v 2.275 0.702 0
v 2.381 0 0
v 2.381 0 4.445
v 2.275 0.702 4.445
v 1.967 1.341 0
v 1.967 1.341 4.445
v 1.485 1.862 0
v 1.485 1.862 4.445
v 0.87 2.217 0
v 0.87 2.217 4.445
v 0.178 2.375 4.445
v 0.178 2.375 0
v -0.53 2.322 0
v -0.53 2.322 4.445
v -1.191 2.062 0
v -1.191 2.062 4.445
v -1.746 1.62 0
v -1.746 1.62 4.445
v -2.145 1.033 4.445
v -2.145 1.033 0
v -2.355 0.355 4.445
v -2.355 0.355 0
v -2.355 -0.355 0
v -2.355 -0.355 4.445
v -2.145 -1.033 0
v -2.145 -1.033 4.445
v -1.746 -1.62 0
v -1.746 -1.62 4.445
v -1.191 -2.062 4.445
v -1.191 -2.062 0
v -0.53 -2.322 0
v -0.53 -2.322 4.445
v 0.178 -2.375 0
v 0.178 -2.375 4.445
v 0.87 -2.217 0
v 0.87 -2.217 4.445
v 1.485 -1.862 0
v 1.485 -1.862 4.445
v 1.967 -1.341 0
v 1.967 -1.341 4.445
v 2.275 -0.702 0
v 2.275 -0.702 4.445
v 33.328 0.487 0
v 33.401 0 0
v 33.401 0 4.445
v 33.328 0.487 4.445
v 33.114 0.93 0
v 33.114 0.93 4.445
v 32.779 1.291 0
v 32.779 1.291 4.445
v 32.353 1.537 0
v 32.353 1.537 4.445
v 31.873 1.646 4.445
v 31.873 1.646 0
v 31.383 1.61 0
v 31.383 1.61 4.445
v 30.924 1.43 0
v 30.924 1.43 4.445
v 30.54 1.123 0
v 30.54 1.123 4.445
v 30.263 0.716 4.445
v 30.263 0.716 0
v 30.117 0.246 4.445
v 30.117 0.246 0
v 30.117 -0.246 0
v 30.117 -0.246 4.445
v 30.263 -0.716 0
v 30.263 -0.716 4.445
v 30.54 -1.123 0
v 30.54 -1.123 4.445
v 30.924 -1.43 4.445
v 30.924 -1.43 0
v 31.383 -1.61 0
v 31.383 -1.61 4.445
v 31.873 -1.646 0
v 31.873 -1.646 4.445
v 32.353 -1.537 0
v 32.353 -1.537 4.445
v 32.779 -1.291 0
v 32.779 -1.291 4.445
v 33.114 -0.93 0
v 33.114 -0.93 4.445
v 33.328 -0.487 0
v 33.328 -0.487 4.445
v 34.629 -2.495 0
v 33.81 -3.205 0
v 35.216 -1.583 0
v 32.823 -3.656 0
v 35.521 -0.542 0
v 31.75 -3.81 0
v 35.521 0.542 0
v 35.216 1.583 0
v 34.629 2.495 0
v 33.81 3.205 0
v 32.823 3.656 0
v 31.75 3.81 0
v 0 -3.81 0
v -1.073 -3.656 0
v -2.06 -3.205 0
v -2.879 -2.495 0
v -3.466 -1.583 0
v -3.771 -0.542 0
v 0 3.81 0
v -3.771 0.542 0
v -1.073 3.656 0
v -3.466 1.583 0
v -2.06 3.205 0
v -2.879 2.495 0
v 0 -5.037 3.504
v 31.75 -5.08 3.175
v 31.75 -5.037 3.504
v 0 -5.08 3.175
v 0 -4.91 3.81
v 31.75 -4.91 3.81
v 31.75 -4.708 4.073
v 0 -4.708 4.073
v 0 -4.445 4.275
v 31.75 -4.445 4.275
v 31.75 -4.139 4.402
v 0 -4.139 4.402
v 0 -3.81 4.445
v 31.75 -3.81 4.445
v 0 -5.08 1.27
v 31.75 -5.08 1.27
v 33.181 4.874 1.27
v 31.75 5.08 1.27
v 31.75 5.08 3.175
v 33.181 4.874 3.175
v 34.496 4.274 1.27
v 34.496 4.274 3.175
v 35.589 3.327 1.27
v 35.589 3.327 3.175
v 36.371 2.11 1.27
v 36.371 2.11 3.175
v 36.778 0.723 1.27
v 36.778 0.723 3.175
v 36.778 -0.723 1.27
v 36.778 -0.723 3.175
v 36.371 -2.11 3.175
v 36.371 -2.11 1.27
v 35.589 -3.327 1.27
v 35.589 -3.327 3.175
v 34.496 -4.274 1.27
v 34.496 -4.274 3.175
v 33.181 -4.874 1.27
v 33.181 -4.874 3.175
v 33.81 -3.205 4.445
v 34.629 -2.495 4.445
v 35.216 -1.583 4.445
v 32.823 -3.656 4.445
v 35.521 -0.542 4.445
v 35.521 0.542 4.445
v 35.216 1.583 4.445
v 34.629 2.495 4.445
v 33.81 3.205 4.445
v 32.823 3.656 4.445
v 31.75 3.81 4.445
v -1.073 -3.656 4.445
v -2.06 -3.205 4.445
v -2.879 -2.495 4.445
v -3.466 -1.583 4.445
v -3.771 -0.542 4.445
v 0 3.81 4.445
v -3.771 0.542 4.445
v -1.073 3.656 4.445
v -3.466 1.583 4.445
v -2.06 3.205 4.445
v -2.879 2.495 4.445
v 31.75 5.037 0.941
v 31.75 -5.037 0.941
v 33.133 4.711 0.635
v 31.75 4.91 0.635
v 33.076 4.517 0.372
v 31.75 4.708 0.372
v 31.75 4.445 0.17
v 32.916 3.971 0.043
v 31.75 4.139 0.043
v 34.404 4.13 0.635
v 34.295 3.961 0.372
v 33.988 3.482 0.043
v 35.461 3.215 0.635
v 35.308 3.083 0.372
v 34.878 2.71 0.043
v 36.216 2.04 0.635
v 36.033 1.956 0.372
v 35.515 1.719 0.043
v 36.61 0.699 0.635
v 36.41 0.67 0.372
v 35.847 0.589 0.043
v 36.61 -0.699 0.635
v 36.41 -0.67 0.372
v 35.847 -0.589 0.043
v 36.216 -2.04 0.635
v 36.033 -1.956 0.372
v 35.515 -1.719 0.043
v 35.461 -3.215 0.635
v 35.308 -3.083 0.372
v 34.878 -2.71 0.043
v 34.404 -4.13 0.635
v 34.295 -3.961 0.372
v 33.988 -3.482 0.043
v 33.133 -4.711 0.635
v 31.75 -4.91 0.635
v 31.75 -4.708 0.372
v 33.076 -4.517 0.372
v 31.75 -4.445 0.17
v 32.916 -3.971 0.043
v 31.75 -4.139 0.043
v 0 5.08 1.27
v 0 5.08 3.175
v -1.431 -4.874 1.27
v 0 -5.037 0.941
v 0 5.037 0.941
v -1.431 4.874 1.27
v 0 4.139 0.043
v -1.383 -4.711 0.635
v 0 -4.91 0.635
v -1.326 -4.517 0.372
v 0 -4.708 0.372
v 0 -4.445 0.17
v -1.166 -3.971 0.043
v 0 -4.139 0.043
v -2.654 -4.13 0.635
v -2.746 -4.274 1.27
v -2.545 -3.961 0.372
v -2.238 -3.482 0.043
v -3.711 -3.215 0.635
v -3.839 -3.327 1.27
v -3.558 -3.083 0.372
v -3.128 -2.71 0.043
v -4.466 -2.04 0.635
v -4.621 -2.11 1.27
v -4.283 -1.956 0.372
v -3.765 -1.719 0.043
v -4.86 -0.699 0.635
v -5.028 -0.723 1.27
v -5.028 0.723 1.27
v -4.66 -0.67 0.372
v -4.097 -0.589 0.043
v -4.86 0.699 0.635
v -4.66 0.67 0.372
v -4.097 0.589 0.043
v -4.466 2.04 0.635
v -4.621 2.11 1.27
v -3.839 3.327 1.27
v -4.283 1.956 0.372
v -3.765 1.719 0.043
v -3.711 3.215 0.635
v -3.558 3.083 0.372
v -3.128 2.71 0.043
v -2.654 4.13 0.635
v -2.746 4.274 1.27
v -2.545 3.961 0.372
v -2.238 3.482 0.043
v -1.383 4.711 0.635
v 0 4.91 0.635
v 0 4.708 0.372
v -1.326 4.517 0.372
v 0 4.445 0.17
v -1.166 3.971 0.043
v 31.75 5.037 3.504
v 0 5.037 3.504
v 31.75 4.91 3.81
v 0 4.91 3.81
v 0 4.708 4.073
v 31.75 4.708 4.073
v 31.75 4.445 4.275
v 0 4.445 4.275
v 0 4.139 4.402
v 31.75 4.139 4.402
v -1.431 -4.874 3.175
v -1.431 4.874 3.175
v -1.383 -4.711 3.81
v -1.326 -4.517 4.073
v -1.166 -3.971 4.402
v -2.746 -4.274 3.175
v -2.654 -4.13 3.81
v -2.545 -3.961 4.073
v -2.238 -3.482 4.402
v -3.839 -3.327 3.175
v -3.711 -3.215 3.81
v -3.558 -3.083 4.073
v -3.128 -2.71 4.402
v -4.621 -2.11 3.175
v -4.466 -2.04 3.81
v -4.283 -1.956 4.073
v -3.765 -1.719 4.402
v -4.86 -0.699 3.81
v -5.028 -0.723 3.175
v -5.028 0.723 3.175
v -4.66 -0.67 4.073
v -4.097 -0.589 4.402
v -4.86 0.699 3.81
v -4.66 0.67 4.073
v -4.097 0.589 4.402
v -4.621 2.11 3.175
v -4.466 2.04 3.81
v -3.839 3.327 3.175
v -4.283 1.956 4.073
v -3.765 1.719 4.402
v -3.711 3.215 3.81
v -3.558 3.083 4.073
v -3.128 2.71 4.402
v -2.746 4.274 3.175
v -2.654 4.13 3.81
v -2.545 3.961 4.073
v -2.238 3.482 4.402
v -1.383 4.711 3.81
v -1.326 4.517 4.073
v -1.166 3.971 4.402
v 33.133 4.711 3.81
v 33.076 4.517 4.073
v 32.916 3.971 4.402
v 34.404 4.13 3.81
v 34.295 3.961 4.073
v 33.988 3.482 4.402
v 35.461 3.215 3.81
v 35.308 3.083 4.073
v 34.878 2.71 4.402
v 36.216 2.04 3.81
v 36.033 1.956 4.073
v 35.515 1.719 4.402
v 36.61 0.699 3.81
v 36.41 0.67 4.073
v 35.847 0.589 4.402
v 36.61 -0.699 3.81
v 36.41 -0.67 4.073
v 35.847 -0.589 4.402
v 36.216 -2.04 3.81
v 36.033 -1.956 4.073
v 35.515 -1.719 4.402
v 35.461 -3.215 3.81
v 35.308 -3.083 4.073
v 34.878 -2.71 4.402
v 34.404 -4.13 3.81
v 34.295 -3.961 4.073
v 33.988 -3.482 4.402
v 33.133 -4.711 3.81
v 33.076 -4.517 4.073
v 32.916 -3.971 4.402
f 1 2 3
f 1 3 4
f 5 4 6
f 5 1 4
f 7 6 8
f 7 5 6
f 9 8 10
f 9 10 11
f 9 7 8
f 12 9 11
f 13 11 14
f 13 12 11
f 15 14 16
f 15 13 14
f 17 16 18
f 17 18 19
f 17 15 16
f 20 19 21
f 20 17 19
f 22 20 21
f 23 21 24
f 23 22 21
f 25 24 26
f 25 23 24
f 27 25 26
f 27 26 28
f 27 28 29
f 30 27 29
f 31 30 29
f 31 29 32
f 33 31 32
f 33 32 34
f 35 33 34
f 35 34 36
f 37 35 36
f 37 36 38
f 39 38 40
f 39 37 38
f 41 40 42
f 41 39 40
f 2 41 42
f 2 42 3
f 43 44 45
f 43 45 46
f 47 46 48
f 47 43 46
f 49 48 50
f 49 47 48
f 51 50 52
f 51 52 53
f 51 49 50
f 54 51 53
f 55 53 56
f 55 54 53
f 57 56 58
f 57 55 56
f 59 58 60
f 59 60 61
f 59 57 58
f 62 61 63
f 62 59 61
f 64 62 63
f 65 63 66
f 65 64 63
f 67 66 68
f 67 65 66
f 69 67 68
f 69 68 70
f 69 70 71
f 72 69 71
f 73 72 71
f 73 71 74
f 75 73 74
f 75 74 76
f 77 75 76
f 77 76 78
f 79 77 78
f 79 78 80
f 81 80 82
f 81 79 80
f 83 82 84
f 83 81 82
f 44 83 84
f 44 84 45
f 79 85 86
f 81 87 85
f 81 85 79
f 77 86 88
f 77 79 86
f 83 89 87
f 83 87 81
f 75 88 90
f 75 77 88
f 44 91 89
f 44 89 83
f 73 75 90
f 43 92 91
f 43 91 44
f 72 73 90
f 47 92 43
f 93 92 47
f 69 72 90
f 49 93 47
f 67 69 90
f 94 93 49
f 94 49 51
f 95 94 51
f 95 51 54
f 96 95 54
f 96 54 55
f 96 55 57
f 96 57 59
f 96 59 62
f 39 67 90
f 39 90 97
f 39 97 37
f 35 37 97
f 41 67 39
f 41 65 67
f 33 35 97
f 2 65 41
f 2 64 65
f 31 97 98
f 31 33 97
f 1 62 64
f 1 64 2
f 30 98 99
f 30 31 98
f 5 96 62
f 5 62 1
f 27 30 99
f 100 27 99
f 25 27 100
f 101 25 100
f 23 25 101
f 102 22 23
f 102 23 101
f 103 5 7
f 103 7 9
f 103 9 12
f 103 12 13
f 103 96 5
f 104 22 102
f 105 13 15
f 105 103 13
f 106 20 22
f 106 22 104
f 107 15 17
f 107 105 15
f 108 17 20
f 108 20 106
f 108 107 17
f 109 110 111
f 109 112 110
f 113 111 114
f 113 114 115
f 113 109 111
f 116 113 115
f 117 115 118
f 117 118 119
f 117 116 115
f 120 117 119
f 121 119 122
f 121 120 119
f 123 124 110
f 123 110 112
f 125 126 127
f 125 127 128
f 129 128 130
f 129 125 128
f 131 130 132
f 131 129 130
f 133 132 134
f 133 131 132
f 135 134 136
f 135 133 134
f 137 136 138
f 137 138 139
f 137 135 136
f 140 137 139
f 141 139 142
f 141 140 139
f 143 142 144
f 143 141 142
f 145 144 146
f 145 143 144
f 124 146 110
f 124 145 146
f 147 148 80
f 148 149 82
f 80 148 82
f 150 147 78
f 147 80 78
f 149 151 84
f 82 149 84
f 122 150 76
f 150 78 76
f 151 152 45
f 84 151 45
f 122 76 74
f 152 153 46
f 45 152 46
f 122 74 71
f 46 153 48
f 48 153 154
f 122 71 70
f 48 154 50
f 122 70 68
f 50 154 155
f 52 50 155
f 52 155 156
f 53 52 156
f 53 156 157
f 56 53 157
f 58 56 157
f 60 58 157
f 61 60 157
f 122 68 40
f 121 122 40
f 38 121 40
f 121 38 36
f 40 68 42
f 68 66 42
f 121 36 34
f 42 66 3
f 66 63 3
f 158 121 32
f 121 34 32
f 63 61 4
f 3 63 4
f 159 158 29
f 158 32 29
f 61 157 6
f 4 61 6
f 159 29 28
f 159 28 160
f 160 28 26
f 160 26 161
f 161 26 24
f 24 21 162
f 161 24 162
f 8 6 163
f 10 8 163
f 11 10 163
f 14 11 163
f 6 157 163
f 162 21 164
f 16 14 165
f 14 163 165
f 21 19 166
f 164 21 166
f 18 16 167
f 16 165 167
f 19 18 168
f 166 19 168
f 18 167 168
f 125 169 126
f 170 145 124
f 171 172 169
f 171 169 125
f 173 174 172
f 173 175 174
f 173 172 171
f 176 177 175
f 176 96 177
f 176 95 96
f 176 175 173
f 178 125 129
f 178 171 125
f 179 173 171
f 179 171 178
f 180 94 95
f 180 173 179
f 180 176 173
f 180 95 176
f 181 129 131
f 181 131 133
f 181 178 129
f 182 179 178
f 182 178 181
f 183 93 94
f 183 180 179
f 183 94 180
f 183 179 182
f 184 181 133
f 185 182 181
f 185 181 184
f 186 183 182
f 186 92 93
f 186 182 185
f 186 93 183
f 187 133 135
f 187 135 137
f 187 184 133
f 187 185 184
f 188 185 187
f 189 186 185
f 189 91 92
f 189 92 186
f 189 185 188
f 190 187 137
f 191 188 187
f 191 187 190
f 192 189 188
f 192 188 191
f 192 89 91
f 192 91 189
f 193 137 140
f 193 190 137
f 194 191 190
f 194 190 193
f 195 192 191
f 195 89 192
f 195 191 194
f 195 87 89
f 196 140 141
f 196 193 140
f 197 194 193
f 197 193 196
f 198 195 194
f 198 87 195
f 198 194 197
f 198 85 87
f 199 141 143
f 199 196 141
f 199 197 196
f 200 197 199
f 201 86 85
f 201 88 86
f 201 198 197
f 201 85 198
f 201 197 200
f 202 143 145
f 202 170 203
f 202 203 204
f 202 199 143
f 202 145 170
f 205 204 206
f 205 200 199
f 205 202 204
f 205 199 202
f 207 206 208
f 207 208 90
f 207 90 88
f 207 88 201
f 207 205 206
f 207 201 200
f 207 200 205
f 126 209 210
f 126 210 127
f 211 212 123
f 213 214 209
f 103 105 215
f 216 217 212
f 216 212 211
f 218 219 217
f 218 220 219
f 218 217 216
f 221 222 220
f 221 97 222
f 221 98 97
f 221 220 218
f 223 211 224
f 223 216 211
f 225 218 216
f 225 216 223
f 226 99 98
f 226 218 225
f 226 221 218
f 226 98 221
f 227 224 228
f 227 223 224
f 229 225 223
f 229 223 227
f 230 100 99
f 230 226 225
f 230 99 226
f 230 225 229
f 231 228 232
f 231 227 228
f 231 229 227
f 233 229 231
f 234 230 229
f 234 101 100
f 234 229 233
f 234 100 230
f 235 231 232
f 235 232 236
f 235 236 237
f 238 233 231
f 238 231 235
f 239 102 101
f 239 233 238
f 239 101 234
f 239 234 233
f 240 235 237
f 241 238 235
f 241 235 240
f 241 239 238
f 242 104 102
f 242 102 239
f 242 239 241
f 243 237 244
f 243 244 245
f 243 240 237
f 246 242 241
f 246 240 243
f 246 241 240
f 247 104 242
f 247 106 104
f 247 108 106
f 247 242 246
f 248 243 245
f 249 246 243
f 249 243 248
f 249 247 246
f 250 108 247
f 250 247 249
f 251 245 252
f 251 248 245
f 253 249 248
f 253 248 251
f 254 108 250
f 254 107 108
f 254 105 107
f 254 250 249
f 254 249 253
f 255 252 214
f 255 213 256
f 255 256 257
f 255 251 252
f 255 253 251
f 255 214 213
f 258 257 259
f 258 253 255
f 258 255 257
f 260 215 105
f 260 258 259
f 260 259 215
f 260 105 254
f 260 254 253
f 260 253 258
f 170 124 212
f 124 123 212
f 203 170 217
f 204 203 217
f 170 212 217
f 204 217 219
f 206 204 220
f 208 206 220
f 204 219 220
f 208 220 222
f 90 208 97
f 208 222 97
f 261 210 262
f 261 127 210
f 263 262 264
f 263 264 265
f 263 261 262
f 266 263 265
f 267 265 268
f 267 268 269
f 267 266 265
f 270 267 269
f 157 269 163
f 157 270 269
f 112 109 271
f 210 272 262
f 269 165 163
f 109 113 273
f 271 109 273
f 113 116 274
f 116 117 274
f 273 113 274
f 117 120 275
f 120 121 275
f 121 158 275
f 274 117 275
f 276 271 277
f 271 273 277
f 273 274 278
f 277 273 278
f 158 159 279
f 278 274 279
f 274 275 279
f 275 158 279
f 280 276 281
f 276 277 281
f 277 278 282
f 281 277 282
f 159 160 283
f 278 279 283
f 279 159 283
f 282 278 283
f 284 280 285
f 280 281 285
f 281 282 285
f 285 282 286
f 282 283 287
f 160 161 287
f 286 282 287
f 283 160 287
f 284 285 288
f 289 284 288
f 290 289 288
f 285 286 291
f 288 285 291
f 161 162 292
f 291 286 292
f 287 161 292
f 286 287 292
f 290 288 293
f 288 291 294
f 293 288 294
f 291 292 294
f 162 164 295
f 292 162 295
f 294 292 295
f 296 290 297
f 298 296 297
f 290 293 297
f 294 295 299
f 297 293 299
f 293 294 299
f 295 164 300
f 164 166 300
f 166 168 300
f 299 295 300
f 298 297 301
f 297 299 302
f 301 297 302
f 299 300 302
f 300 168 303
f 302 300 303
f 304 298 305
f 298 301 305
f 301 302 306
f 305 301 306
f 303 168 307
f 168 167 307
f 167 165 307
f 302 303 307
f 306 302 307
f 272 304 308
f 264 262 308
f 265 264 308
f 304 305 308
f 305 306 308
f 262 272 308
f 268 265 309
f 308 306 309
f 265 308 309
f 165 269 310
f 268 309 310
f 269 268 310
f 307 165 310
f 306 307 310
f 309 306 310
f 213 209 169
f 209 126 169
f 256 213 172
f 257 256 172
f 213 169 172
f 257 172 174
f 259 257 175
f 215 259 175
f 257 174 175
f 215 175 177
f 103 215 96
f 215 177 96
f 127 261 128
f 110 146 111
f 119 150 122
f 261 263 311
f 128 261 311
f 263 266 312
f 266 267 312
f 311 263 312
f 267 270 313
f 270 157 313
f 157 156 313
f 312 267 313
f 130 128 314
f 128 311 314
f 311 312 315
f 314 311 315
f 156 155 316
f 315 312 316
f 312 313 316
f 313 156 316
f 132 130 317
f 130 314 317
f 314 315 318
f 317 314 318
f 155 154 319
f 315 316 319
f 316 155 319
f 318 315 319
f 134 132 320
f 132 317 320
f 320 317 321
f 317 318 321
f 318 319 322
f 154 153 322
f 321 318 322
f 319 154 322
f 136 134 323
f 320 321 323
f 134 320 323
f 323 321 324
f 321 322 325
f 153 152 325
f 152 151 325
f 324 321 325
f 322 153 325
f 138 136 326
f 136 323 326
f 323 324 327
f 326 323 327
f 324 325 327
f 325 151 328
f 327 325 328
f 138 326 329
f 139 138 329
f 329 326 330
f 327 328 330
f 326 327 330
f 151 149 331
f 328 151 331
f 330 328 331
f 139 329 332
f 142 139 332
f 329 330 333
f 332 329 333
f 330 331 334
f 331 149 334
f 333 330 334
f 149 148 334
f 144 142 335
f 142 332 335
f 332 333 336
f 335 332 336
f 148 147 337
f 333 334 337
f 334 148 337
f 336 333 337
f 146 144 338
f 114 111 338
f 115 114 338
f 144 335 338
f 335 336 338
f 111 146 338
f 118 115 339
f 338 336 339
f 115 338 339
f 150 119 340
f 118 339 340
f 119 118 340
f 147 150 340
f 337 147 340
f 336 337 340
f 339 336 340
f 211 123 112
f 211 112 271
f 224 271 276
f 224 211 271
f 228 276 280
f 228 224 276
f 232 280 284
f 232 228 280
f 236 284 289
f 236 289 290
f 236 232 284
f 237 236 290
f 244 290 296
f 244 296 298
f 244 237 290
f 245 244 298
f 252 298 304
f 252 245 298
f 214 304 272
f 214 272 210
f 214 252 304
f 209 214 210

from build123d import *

# Parameters (mm, degrees)
SKETCH1_R           = 2.38125
SKETCH1_R_2         = 1.651
BOSS_EXTRUDE1_DEPTH = 4.445
FILLET1_R           = 1.27


with BuildPart() as part:
    # Sketch1 → Boss-Extrude1 (new body)
    with BuildSketch(Plane.XY):
        with BuildLine():
            Line((0, 5.08), (31.75, 5.08))
            ThreePointArc((31.75, 5.08), (36.83, 0), (31.75, -5.08))
            Line((31.75, -5.08), (0, -5.08))
            ThreePointArc((0, -5.08), (-5.08, 0), (0, 5.08))
        make_face()
        Circle(SKETCH1_R, mode=Mode.SUBTRACT)
        with Locations((31.75, 0)):
            Circle(SKETCH1_R_2, mode=Mode.SUBTRACT)
    extrude(amount=BOSS_EXTRUDE1_DEPTH)

    # Fillet1
    fillet1_edges = [part.edges().sort_by_distance(p)[0] for p in [
        (36.83, 0, 4.445),
        (15.875, 5.08, 4.445),
        (-5.08, 0, 4.445),
        (15.875, 5.08, 0),
        (36.83, 0, 0),
        (15.875, -5.08, 0),
        (-5.08, 0, 0),
        (15.875, -5.08, 4.445),
    ]]
    fillet(fillet1_edges, radius=FILLET1_R)


solid = part.part
